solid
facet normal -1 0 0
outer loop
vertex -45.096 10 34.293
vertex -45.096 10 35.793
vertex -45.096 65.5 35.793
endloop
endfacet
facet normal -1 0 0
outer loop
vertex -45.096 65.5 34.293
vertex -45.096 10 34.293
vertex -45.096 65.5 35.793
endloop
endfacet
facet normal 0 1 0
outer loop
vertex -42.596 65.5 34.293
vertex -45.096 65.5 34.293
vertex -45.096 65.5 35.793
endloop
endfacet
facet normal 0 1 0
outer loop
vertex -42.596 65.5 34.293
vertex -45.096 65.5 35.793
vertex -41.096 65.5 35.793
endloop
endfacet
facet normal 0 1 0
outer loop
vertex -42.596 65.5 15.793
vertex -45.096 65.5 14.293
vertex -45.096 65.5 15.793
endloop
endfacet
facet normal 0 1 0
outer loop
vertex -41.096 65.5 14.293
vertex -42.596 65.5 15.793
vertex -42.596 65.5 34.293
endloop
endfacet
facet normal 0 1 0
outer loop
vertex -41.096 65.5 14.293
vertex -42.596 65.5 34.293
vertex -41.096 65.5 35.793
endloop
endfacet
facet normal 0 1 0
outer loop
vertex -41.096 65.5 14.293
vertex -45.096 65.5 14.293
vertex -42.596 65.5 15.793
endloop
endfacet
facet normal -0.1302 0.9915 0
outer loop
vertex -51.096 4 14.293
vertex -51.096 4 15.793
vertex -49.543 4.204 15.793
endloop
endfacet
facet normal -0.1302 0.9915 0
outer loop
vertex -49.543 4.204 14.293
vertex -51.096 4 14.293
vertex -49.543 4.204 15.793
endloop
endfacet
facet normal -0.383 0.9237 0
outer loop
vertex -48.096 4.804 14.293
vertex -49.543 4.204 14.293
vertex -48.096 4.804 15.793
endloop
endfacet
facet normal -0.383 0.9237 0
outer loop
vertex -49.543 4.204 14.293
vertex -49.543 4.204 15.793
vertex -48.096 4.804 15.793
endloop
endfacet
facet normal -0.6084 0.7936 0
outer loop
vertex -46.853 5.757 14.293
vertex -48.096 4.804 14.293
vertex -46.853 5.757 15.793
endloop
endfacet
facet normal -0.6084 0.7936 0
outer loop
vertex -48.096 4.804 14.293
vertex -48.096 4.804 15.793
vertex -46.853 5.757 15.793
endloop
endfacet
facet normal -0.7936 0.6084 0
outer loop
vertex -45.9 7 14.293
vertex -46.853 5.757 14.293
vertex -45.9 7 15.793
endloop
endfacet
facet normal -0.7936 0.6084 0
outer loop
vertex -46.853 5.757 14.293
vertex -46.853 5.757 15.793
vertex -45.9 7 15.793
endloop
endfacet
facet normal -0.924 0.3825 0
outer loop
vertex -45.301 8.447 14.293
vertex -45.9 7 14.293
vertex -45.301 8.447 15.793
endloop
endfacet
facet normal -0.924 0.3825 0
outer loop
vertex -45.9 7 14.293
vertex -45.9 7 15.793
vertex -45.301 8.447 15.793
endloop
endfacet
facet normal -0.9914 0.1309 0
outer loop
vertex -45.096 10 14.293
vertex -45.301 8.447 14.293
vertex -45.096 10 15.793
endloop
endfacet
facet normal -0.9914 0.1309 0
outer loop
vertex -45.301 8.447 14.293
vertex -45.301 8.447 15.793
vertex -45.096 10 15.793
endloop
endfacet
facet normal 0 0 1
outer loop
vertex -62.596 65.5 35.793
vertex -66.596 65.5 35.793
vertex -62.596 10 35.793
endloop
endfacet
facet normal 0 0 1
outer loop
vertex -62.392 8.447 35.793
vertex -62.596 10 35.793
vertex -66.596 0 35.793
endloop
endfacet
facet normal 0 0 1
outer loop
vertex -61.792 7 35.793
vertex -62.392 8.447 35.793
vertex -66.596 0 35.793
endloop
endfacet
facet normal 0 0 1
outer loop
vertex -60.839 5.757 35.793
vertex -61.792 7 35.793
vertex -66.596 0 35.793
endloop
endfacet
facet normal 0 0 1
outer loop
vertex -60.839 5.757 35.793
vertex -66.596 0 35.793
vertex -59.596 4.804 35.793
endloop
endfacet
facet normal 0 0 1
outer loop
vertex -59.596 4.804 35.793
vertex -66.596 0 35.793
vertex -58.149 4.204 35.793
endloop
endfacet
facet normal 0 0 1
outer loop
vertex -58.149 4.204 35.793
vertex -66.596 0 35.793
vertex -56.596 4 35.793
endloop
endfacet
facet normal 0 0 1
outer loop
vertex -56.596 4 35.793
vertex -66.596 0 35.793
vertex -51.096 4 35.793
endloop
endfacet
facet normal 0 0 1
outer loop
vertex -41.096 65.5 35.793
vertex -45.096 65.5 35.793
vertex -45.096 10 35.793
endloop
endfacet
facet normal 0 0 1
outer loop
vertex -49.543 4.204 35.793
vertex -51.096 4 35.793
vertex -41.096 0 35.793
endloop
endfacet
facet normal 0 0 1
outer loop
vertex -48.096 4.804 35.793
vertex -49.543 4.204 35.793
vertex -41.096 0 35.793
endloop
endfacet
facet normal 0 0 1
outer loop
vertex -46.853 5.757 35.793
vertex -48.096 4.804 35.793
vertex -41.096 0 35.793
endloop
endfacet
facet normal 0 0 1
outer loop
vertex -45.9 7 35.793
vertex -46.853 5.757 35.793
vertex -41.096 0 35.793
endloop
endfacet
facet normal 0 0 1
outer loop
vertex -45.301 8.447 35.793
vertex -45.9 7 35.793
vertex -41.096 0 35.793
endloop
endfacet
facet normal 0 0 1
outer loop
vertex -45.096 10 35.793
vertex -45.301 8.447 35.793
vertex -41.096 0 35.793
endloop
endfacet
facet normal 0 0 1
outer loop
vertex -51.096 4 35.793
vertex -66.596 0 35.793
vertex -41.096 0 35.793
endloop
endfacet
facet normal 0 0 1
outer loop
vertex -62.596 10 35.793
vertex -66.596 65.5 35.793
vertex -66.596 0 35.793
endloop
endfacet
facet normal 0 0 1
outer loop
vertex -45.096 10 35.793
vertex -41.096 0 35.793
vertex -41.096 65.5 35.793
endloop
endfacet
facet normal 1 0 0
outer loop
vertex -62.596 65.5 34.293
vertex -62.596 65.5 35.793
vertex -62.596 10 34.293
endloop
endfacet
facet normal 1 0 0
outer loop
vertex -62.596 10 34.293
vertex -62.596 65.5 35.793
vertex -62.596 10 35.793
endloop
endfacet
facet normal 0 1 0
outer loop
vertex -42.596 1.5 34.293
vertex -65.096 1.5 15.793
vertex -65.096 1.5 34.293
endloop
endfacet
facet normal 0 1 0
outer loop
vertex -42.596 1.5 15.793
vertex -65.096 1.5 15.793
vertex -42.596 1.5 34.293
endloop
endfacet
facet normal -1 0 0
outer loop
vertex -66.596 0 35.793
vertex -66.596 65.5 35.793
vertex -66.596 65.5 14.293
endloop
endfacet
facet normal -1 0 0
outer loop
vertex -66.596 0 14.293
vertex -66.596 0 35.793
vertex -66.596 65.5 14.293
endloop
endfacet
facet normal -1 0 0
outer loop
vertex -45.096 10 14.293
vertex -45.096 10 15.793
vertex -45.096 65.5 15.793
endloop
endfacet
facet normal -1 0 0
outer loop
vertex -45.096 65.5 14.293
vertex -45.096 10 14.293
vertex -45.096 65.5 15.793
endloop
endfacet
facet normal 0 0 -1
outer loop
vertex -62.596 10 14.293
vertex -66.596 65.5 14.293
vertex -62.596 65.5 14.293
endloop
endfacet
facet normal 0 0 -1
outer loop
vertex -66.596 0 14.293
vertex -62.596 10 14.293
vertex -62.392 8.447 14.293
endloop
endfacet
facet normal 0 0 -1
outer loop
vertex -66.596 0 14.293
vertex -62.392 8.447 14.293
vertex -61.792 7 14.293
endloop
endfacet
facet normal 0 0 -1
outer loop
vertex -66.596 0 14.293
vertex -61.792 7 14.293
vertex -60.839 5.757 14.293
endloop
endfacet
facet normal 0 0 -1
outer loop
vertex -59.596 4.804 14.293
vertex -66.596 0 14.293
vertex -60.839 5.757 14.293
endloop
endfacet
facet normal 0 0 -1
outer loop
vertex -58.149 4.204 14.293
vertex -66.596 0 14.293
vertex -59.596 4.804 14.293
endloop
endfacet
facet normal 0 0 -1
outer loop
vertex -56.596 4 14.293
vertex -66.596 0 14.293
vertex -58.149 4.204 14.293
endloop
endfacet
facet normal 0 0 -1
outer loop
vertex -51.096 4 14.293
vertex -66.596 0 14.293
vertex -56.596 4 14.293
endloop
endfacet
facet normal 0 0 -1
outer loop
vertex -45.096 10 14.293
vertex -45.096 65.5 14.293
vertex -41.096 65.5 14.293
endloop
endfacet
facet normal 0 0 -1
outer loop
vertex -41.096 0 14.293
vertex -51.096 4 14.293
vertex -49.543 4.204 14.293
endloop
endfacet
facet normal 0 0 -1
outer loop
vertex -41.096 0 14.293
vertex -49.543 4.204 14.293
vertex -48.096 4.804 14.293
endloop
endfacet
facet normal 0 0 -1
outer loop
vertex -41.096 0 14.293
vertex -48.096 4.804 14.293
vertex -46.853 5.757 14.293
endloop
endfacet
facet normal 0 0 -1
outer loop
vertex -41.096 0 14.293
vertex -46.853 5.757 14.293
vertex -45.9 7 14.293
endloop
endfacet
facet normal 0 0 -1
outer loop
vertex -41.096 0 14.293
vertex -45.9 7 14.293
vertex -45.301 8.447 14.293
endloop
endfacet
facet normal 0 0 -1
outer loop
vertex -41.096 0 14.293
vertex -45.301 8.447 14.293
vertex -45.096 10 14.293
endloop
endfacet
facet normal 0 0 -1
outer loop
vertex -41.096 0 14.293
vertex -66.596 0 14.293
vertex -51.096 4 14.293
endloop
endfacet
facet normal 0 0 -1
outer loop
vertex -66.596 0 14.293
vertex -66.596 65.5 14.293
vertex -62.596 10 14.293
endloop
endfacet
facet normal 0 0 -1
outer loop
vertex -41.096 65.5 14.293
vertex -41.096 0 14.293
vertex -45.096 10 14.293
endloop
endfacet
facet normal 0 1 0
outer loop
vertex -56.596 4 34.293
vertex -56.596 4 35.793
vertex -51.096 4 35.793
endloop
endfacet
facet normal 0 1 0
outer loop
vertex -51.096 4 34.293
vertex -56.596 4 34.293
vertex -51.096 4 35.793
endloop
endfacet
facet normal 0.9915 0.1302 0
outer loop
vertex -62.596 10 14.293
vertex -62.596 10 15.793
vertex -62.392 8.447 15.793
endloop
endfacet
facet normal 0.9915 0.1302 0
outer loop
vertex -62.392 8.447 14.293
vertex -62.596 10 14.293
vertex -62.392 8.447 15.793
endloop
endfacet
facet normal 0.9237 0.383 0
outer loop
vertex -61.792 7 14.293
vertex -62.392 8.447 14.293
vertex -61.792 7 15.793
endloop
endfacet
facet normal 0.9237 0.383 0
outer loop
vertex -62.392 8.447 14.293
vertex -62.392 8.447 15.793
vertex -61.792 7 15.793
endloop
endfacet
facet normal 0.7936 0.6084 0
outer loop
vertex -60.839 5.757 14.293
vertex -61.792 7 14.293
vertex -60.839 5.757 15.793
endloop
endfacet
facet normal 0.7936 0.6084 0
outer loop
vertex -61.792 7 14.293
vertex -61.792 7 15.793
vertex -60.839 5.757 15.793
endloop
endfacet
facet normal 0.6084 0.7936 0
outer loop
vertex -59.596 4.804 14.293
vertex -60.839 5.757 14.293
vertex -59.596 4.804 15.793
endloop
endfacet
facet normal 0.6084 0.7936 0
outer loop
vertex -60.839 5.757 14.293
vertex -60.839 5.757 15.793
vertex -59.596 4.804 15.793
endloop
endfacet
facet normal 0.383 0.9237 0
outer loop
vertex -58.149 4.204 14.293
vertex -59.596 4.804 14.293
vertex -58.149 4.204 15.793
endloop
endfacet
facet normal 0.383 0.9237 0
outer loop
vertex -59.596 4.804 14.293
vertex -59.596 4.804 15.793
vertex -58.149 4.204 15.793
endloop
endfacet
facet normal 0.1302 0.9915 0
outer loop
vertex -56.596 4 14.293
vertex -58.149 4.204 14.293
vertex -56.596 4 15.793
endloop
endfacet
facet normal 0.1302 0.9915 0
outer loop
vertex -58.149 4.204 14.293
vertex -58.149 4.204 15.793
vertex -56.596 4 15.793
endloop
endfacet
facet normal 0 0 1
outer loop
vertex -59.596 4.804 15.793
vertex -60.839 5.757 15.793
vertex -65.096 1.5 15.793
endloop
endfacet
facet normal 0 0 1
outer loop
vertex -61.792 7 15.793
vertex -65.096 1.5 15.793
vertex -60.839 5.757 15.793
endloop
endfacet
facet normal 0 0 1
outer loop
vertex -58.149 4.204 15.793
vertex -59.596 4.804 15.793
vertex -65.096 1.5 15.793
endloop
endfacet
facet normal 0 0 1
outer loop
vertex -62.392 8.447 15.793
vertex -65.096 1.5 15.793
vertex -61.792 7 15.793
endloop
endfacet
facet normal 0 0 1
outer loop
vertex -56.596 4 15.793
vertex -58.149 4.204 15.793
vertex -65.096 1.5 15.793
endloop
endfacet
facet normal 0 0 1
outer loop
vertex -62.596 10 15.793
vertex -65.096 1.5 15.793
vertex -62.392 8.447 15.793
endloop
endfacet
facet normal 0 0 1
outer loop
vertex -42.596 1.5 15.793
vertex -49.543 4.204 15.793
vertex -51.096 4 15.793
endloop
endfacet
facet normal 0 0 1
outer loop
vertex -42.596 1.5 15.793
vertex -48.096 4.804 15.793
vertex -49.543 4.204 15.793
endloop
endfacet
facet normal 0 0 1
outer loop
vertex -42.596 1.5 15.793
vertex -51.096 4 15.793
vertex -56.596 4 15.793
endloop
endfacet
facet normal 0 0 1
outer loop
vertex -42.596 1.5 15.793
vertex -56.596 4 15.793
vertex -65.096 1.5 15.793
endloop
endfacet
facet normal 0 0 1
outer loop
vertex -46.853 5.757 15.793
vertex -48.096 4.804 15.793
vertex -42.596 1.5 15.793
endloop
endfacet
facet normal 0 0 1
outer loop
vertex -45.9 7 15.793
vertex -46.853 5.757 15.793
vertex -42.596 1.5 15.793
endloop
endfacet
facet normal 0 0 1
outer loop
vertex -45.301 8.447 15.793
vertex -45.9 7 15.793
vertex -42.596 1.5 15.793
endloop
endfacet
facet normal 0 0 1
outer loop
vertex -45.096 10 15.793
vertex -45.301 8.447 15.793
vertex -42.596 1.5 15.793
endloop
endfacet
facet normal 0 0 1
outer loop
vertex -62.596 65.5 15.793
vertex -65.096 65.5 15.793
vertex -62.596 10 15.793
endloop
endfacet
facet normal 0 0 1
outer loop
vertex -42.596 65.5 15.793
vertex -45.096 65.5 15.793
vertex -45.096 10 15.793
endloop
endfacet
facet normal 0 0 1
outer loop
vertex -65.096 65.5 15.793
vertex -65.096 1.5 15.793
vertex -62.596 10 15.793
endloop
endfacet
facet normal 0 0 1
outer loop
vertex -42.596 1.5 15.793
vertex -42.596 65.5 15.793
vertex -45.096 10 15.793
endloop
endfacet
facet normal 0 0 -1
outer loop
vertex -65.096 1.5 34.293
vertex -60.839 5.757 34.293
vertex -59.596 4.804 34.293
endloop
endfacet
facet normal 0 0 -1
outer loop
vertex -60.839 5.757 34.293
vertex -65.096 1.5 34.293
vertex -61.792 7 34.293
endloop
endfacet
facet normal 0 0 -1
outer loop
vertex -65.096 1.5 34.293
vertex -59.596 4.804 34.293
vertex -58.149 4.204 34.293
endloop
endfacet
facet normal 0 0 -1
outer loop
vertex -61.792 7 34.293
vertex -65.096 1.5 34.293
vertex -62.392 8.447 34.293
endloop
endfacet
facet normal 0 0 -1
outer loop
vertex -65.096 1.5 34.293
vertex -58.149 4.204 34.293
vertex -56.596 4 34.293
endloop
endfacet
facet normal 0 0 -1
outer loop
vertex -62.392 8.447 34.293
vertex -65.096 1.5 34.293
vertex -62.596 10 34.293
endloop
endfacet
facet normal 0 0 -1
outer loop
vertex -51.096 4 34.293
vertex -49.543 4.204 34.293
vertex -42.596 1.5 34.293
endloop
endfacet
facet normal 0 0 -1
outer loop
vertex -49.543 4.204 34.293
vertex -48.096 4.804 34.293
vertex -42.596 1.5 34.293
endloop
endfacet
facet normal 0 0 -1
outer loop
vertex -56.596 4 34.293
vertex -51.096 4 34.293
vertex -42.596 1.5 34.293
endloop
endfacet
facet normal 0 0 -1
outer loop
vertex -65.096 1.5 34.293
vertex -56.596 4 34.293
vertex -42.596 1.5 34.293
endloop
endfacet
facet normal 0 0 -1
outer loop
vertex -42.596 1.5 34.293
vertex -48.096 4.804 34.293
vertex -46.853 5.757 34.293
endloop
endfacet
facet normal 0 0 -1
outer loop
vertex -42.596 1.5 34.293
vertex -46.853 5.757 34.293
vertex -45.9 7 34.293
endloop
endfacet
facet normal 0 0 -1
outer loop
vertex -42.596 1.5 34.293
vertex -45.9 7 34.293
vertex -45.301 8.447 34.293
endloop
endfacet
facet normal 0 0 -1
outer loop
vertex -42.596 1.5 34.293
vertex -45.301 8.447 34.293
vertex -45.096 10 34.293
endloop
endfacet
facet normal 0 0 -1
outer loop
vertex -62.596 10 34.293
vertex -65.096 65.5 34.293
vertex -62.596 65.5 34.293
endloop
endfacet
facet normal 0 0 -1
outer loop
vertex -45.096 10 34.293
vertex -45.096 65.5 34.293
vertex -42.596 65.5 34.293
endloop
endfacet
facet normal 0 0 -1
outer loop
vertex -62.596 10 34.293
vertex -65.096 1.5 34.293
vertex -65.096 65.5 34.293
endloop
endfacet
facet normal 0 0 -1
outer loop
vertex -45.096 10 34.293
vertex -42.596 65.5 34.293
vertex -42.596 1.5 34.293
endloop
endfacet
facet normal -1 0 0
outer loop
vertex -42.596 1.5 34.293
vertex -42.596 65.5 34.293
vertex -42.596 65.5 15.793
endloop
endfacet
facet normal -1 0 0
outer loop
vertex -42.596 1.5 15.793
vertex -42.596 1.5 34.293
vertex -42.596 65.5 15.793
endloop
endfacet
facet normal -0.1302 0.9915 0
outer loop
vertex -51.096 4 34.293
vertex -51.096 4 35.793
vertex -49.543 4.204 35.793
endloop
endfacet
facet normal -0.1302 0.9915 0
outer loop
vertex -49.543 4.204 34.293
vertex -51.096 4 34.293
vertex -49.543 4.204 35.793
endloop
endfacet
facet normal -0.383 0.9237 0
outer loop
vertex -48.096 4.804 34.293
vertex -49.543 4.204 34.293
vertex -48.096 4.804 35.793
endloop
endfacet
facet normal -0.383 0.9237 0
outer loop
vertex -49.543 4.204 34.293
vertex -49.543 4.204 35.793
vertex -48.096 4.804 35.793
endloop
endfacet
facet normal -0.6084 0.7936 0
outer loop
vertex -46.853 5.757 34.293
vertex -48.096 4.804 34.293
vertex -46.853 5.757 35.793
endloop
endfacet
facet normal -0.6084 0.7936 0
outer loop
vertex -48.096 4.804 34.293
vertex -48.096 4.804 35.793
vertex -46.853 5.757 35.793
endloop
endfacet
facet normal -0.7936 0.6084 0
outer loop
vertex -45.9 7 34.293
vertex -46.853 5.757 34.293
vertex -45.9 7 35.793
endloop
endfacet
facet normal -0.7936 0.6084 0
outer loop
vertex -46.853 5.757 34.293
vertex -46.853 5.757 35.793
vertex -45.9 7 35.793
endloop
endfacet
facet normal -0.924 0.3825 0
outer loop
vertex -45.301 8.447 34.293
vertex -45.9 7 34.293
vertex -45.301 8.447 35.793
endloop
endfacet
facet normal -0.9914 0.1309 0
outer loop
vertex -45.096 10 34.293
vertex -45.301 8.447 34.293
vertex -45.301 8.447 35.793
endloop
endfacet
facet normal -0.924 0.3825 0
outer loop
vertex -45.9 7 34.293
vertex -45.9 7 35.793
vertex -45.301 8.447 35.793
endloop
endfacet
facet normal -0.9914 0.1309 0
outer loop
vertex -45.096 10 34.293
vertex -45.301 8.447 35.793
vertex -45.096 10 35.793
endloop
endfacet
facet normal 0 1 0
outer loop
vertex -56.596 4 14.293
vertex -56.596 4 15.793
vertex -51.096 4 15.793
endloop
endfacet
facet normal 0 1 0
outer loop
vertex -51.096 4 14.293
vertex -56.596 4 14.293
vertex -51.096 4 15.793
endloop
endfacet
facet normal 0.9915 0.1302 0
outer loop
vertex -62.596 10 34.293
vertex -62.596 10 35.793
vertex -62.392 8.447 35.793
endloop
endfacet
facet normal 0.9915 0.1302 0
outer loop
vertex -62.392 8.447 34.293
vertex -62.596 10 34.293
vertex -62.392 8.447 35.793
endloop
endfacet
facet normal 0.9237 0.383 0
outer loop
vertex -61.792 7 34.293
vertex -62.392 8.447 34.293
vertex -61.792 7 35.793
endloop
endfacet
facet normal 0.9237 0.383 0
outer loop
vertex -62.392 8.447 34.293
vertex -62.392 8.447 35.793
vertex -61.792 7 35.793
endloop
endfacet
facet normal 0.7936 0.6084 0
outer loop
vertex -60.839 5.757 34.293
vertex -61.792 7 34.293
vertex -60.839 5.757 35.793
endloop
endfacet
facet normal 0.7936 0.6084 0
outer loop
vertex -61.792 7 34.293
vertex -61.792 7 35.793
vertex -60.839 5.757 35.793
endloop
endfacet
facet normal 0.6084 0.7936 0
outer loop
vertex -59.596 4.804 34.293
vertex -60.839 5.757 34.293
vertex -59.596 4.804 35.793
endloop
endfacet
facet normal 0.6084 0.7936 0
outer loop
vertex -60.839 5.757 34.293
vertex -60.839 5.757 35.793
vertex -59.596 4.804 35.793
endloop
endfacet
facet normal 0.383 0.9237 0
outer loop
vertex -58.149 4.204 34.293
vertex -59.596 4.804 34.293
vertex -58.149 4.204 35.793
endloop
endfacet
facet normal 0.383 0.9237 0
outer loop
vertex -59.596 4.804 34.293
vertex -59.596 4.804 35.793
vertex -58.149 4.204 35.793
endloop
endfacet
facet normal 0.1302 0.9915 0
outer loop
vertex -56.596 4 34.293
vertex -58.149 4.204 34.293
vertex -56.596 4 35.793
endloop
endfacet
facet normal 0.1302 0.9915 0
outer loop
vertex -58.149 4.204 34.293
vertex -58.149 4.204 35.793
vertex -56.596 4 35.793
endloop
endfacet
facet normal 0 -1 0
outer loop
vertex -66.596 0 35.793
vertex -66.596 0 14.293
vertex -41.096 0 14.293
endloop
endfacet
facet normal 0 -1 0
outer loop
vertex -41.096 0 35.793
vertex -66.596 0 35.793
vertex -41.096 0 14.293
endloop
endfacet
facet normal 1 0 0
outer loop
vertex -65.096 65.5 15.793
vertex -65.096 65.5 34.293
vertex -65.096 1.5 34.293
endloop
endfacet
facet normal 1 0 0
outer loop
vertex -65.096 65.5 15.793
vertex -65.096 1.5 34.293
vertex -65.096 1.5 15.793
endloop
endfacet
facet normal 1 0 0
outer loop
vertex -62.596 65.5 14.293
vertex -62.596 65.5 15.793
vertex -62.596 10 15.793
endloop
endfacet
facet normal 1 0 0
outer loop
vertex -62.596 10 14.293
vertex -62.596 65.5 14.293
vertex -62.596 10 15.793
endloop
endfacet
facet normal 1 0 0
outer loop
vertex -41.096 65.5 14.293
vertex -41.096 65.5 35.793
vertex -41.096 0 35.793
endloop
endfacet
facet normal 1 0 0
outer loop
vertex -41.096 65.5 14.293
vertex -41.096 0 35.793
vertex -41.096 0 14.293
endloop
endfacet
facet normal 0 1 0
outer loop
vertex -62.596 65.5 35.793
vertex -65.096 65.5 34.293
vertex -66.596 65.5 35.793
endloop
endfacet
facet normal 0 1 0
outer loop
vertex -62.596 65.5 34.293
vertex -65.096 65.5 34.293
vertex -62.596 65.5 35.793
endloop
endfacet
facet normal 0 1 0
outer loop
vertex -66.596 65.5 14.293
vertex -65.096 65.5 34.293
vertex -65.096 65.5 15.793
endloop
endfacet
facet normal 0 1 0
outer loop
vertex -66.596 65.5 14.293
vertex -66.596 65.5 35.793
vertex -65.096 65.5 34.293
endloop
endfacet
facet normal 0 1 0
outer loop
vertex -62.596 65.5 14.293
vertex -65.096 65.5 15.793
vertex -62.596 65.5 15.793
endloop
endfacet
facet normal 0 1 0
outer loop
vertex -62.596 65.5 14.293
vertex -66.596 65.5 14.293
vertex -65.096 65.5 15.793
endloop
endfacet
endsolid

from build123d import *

# Parameters (mm, degrees)
SKETCH1_W           = 25.5
SKETCH1_H           = 21.5
BOSS_EXTRUDE1_DEPTH = 65.5
SKETCH2_W           = 22.5
SKETCH2_H           = 18.5
CUT_EXTRUDE1_DEPTH  = 64
CUT_EXTRUDE2_DEPTH  = 21.5


with BuildPart() as part:
    # Sketch1 → Boss-Extrude1 (new body)
    with BuildSketch(Plane(origin=(0, 0, 0), x_dir=(1, 0, 0), z_dir=(0, 1, 0))):
        with Locations((-53.846079549, -25.043168737)):
            Rectangle(SKETCH1_W, SKETCH1_H)
    extrude(amount=BOSS_EXTRUDE1_DEPTH)

    # Sketch2 → Cut-Extrude1 (cut)
    with BuildSketch(Plane(origin=(0, 65.5, 0), x_dir=(1, 0, 0), z_dir=(0, 1, 0))):
        with Locations((-53.846079549, -25.043168737)):
            Rectangle(SKETCH2_W, SKETCH2_H)
    extrude(amount=-CUT_EXTRUDE1_DEPTH, mode=Mode.SUBTRACT)

    # Sketch5 → Cut-Extrude2 (cut)
    with BuildSketch(Plane.XY.offset(35.793168737)):
        with BuildLine():
            Line((-45.096079549, 65.5), (-62.596079549, 65.5))
            Line((-62.596079549, 65.5), (-62.596079549, 10))
            ThreePointArc((-62.596079549, 10), (-60.838720236, 5.757359313), (-56.596079549, 4))
            Line((-56.596079549, 4), (-51.096079549, 4))
            ThreePointArc((-51.096079549, 4), (-46.853438862, 5.757359313), (-45.096079549, 10))
            Line((-45.096079549, 10), (-45.096079549, 65.5))
        make_face()
    extrude(amount=-CUT_EXTRUDE2_DEPTH, mode=Mode.SUBTRACT)


solid = part.part
